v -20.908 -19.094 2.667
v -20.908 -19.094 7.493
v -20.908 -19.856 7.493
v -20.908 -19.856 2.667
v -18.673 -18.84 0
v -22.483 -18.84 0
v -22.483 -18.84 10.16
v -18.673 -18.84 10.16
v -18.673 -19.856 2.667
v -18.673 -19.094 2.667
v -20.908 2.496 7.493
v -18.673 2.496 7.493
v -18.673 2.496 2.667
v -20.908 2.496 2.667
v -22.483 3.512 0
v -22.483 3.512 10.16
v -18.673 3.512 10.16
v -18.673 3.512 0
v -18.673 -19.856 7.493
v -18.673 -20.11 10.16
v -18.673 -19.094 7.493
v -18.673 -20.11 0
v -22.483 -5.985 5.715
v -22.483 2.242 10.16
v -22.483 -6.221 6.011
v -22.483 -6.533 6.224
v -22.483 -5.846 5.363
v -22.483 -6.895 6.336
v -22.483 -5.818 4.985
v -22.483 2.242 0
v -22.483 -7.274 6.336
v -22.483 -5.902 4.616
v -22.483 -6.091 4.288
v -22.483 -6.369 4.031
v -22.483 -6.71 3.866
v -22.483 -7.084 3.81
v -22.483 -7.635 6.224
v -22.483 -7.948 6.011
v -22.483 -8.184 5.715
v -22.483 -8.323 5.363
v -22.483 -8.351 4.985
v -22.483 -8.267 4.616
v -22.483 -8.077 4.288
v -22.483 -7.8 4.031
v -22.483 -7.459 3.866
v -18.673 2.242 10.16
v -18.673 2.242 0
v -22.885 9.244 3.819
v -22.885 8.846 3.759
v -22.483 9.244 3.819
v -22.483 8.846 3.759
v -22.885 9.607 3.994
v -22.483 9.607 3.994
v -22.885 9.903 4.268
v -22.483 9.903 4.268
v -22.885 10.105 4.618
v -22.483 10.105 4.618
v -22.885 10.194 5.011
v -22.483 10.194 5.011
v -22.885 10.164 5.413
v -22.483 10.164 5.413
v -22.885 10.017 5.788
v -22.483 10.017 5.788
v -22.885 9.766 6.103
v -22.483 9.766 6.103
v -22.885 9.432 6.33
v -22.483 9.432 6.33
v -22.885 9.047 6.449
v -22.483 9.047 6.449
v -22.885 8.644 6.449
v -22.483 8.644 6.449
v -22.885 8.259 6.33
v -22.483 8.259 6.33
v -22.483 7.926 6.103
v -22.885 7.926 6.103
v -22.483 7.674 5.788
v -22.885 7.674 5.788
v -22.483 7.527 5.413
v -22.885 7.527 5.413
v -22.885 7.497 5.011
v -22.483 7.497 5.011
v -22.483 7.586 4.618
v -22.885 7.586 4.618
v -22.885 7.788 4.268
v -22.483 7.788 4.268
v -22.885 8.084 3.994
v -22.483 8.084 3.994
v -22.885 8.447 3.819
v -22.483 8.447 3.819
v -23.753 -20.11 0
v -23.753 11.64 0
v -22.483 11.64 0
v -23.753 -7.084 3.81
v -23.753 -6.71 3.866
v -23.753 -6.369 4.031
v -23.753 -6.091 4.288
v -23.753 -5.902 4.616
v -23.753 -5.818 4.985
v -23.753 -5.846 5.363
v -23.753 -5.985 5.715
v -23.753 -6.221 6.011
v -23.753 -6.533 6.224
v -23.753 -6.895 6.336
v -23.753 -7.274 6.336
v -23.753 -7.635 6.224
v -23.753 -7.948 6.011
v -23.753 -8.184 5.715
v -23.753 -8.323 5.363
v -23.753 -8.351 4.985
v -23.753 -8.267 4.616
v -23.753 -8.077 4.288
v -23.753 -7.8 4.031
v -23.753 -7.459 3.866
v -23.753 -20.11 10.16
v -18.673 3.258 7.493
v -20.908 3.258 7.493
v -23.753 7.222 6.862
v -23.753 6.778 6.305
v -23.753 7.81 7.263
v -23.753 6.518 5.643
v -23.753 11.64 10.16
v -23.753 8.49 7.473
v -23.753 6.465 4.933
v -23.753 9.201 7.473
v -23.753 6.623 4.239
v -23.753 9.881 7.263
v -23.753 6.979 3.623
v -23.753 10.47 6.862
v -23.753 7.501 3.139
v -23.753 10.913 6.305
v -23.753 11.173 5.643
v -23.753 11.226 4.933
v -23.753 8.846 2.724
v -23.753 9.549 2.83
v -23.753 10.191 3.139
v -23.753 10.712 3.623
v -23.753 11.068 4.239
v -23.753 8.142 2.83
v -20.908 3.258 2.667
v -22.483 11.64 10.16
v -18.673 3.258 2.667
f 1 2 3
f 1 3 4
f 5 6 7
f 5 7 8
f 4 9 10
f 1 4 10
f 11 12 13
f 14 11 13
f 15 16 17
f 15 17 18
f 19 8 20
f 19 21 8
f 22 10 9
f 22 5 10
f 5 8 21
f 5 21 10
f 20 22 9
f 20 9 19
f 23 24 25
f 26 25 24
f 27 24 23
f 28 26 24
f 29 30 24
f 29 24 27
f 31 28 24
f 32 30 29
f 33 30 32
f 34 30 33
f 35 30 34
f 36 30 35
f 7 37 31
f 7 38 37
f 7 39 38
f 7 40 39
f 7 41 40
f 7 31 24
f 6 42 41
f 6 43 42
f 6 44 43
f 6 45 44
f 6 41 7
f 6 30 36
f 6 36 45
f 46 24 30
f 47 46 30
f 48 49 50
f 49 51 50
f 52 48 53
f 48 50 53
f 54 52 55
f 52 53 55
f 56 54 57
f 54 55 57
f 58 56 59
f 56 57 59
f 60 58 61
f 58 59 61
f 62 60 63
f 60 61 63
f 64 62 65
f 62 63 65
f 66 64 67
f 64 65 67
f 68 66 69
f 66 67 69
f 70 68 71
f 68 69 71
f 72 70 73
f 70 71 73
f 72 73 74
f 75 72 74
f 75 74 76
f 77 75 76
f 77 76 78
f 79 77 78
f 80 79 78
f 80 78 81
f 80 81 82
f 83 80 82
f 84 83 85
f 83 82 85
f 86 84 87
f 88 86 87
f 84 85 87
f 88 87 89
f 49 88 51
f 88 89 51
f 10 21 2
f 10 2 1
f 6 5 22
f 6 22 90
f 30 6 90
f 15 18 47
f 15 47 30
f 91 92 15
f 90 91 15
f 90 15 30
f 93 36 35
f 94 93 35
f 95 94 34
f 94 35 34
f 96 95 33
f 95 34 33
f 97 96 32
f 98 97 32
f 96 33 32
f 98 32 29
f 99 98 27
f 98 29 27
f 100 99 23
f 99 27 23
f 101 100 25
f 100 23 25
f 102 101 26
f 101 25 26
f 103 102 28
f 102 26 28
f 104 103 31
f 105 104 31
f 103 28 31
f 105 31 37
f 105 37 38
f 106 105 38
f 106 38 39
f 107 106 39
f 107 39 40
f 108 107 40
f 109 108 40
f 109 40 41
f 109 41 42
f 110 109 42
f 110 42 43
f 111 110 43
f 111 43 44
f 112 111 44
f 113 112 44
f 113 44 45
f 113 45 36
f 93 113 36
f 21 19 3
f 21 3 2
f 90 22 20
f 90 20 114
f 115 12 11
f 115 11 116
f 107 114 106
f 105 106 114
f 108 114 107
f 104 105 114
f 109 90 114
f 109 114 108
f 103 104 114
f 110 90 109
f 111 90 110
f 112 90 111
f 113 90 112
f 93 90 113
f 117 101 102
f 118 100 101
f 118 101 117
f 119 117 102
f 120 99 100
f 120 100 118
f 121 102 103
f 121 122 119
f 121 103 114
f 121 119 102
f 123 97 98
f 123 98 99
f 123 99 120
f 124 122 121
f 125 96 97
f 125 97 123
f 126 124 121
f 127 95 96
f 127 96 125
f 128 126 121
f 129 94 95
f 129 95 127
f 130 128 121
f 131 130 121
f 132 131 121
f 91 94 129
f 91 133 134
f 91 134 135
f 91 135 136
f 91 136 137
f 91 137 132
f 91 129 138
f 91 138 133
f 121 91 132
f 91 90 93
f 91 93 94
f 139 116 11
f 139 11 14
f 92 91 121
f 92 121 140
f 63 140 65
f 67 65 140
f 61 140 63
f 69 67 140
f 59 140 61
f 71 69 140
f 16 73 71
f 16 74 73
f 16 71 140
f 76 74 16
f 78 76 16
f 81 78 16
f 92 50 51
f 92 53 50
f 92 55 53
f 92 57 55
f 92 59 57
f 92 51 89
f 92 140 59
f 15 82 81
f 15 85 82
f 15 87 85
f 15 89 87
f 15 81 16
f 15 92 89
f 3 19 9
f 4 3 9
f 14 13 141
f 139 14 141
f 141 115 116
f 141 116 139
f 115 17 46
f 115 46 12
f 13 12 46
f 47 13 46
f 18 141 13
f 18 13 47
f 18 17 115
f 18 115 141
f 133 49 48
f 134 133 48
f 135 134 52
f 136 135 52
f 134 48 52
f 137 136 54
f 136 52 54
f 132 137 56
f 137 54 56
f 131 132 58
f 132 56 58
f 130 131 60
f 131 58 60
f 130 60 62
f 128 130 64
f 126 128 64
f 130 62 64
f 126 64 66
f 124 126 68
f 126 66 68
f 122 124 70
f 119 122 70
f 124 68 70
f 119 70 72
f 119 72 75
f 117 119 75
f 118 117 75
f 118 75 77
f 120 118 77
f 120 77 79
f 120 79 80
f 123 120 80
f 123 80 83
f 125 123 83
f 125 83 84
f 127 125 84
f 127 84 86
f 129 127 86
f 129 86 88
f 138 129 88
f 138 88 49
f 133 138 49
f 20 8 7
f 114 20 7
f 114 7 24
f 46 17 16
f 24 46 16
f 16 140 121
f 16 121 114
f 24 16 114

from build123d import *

# Parameters (mm, degrees)
BOSS_EXTRUDE1_DEPTH             = 10.16
SKETCH6_W                       = 10.16
SKETCH6_H                       = 1.27
BOSS_EXTRUDE3_DEPTH             = 3.81
SKETCH8_W                       = 4.826
SKETCH8_H                       = 0.762
CUT_EXTRUDE1_DEPTH              = 2.2352
SKETCH5_W                       = 4.826
SKETCH5_H                       = 0.762
CUT_EXTRUDE2_DEPTH              = 2.2352
SKETCH17_R                      = 1.27
CUT_EXTRUDE3_DEPTH              = 2.54
F_6_32_TAPPED_HOLE1_D           = 2.7051
F_6_32_TAPPED_HOLE1_DEPTH       = 9.398
F_6_32_TAPPED_HOLE1_CSINK_D     = 4.7752
F_6_32_TAPPED_HOLE1_CSINK_ANGLE = 100
F_6_32_TAPPED_HOLE1_TIP         = 0.81269403


with BuildPart() as part:
    # Sketch1 → Boss-Extrude1 (new body)
    with BuildSketch(Plane.XY):
        Polygon((-22.483233333, 11.63955), (-22.483233333, -18.84045), (-18.673233333, -18.84045), (-18.673233333, -20.11045), (-23.753233333, -20.11045), (-23.753233333, 11.63955), align=None)
    extrude(amount=BOSS_EXTRUDE1_DEPTH)

    # Sketch6 → Boss-Extrude3 (add)
    with BuildSketch(Plane(origin=(-22.483233333, 0, 0), x_dir=(0, 0, -1), z_dir=(1, 0, 0))):
        with Locations((-5.08, 2.87655)):
            Rectangle(SKETCH6_W, SKETCH6_H)
    extrude(amount=BOSS_EXTRUDE3_DEPTH)

    # Sketch8 → Cut-Extrude1 (cut)
    with BuildSketch(Plane(origin=(-18.673233333, 0, 0), x_dir=(0, 0, -1), z_dir=(1, 0, 0))):
        with Locations((-5.08, 2.87655)):
            Rectangle(SKETCH8_W, SKETCH8_H)
    extrude(amount=-CUT_EXTRUDE1_DEPTH, mode=Mode.SUBTRACT)

    # Sketch5 → Cut-Extrude2 (cut)
    with BuildSketch(Plane(origin=(-18.673233333, 0, 0), x_dir=(0, 0, -1), z_dir=(1, 0, 0))):
        with Locations((-5.08, -19.47545)):
            Rectangle(SKETCH5_W, SKETCH5_H)
    extrude(amount=-CUT_EXTRUDE2_DEPTH, mode=Mode.SUBTRACT)

    # Sketch17 → Cut-Extrude3 (cut)
    with BuildSketch(Plane(origin=(-22.483233333, 0, 0), x_dir=(0, 0, -1), z_dir=(1, 0, 0))):
        with Locations((-5.08, -7.084396388)):
            Circle(SKETCH17_R)
    extrude(amount=-CUT_EXTRUDE3_DEPTH, mode=Mode.SUBTRACT)

    # #6-32 Tapped Hole1
    with Locations(Plane.ZY.offset(23.753233333)):
        with Locations((5.111682079, 8.84555)):
            CounterSinkHole(F_6_32_TAPPED_HOLE1_D / 2, F_6_32_TAPPED_HOLE1_CSINK_D / 2, depth=F_6_32_TAPPED_HOLE1_DEPTH, counter_sink_angle=F_6_32_TAPPED_HOLE1_CSINK_ANGLE)
            with Locations((0, 0, -(F_6_32_TAPPED_HOLE1_DEPTH + F_6_32_TAPPED_HOLE1_TIP / 2))):  # 118° drill point
                Cone(0, F_6_32_TAPPED_HOLE1_D / 2, F_6_32_TAPPED_HOLE1_TIP, mode=Mode.SUBTRACT)


solid = part.part
